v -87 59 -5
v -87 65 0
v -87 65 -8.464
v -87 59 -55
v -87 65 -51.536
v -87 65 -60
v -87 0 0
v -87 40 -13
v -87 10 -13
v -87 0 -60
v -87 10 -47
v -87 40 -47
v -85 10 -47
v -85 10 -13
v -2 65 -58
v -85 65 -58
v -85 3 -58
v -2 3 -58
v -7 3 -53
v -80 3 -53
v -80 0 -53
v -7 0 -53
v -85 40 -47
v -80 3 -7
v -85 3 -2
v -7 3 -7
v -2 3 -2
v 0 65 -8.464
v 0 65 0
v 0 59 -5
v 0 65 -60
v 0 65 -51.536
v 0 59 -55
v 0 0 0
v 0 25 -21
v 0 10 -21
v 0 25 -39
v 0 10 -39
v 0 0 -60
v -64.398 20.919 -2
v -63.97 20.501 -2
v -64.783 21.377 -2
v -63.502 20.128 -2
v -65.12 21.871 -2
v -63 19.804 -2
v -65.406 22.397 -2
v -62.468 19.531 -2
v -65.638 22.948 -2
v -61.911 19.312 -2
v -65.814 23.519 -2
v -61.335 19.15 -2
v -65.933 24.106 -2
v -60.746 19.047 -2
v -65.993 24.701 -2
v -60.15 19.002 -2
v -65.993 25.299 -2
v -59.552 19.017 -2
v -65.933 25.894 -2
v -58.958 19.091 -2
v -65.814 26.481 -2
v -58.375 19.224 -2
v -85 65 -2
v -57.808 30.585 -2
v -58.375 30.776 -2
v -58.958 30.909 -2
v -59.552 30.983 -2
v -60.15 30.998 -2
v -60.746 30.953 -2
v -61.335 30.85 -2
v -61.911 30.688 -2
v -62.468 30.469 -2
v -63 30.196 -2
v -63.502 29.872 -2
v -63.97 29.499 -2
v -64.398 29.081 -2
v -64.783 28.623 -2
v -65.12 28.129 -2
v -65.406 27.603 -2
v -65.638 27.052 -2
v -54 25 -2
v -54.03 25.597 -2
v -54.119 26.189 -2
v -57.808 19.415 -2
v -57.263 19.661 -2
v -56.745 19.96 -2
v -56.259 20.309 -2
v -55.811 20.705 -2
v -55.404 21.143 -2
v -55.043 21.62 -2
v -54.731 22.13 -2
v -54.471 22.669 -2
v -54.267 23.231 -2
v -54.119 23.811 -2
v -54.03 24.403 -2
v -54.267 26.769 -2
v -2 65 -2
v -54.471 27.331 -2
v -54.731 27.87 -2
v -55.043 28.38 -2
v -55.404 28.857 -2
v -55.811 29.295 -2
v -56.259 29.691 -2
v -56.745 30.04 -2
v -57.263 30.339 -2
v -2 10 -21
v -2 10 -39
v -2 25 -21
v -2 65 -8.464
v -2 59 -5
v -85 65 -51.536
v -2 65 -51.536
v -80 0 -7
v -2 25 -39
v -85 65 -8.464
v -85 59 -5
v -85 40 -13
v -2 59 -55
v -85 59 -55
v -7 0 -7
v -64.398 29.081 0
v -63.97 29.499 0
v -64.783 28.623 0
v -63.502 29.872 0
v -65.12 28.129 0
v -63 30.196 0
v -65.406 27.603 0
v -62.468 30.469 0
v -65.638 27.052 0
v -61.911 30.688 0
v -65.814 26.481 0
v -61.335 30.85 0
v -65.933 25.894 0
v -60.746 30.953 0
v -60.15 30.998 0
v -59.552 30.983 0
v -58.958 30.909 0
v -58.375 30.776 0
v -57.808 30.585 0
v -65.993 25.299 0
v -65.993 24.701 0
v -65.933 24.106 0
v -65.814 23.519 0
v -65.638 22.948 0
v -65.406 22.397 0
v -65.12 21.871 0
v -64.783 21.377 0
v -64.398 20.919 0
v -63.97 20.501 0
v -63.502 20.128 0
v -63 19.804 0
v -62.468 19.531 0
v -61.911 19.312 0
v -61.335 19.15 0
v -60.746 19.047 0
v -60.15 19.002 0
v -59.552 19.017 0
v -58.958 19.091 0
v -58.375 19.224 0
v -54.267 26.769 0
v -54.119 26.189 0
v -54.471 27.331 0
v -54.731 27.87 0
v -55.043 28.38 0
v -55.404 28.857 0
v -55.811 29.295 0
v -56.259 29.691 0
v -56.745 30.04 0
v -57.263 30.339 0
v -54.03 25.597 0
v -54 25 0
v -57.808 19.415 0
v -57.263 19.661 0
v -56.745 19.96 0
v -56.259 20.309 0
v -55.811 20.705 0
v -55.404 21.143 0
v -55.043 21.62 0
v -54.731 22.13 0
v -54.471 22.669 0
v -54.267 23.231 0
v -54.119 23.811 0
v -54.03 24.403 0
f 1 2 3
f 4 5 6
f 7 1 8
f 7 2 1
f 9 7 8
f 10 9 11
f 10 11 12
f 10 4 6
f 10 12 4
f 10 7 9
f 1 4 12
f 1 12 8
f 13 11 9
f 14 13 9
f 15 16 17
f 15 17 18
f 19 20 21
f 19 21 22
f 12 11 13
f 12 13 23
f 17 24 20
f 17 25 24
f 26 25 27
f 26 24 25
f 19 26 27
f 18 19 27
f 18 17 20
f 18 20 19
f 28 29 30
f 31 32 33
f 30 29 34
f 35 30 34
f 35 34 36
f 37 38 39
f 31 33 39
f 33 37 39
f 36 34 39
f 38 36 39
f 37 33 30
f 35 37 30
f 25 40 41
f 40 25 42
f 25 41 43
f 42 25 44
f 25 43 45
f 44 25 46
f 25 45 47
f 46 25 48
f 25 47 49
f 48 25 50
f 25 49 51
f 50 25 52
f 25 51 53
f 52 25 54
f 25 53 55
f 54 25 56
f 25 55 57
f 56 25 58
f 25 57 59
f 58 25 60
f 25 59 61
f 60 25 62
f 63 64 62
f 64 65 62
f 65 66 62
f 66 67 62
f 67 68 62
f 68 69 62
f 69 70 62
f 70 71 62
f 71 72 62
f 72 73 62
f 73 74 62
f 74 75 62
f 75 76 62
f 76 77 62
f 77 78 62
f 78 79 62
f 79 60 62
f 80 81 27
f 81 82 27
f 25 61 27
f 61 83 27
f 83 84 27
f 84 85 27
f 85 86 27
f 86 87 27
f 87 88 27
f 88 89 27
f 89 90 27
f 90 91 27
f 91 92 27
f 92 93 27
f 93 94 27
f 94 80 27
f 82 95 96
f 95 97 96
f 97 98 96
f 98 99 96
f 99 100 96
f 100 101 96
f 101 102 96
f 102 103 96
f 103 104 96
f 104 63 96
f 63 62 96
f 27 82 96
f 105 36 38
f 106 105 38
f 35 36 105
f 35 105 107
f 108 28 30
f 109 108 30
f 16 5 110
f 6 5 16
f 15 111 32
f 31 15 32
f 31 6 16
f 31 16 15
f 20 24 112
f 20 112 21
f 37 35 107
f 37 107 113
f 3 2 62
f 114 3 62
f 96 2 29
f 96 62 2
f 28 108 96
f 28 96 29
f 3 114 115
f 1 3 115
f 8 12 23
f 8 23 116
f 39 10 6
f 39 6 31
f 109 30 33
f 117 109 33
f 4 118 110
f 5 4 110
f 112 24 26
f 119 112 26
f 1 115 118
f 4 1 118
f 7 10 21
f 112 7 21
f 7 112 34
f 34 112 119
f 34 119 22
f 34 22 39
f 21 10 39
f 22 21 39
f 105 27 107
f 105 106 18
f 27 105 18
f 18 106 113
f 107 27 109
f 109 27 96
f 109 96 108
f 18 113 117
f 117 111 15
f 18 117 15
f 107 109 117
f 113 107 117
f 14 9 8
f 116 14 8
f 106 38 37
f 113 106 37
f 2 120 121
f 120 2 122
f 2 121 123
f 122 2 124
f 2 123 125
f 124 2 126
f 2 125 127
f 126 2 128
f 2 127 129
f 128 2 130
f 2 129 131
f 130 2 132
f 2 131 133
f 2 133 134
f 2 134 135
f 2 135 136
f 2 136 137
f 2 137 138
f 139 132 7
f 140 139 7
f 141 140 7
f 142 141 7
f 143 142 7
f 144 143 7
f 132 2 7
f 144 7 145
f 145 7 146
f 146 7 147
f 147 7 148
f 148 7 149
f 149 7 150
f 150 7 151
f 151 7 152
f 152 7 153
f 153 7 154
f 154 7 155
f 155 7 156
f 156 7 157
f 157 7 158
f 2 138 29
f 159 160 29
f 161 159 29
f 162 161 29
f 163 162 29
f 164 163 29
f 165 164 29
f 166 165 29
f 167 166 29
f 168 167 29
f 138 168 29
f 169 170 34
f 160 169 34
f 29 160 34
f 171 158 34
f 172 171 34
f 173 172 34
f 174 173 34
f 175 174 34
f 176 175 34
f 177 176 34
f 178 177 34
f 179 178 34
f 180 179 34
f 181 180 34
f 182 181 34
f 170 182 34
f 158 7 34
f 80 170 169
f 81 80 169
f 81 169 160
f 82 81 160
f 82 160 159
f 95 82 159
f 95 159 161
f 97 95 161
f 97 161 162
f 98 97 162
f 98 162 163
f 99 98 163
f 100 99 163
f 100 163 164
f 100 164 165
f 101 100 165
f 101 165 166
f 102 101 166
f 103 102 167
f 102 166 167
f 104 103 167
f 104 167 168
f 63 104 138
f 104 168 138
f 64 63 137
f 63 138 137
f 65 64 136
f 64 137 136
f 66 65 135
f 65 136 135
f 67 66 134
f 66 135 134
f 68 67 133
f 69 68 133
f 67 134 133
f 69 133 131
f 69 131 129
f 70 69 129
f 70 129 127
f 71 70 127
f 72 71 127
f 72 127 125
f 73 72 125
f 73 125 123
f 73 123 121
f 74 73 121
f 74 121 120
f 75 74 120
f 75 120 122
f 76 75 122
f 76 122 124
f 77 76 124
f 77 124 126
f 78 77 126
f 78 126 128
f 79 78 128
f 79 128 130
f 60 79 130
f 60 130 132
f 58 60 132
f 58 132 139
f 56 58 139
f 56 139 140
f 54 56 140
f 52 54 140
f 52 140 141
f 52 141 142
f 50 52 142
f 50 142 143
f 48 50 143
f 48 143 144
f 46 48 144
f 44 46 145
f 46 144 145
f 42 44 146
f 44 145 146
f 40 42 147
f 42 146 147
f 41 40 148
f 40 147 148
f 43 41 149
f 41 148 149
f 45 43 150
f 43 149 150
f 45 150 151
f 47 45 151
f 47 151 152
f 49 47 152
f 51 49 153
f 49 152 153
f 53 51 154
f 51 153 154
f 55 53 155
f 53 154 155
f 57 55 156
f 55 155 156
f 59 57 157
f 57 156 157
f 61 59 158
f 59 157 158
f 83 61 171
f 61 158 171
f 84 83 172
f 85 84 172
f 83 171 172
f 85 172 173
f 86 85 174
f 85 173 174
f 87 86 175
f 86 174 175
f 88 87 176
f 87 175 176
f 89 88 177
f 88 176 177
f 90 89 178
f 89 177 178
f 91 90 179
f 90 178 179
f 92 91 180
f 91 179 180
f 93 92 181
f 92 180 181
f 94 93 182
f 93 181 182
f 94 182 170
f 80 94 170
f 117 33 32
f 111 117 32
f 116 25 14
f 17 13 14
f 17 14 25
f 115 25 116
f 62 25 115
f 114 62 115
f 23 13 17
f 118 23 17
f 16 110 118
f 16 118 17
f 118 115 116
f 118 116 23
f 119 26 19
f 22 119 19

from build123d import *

# Parameters (mm, degrees)
SKETCH1_W           = 87
SKETCH1_H           = 60
BOSS_EXTRUDE1_DEPTH = 65
SKETCH2_W           = 83
SKETCH2_H           = 56
CUT_EXTRUDE1_DEPTH  = 62
SKETCH3_W           = 18
SKETCH3_H           = 15
CUT_EXTRUDE2_DEPTH  = 57
SKETCH4_R           = 6
CUT_EXTRUDE3_DEPTH  = 24
SKETCH5_W           = 34
SKETCH5_H           = 30
CUT_EXTRUDE4_DEPTH  = 24
CUT_EXTRUDE5_DEPTH  = 117
SKETCH7_W           = 73
SKETCH7_H           = 46
CUT_EXTRUDE6_DEPTH  = 10


with BuildPart() as part:
    # Sketch1 → Boss-Extrude1 (new body)
    with BuildSketch(Plane(origin=(0, 0, 0), x_dir=(1, 0, 0), z_dir=(0, 1, 0))):
        with Locations((-43.5, 30)):
            Rectangle(SKETCH1_W, SKETCH1_H)
    extrude(amount=BOSS_EXTRUDE1_DEPTH)

    # Sketch2 → Cut-Extrude1 (cut)
    with BuildSketch(Plane(origin=(0, 65, 0), x_dir=(1, 0, 0), z_dir=(0, 1, 0))):
        with Locations((-43.5, 30)):
            Rectangle(SKETCH2_W, SKETCH2_H)
    extrude(amount=-CUT_EXTRUDE1_DEPTH, mode=Mode.SUBTRACT)

    # Sketch3 → Cut-Extrude2 (cut)
    with BuildSketch(Plane(origin=(0, 0, 0), x_dir=(0, 0, -1), z_dir=(1, 0, 0))):
        with Locations((30, 17.5)):
            Rectangle(SKETCH3_W, SKETCH3_H)
    extrude(amount=-CUT_EXTRUDE2_DEPTH, mode=Mode.SUBTRACT)

    # Sketch4 → Cut-Extrude3 (cut)
    with BuildSketch(Plane.XY):
        with Locations((-60, 25)):
            Circle(SKETCH4_R)
    extrude(amount=-CUT_EXTRUDE3_DEPTH, mode=Mode.SUBTRACT)

    # Sketch5 → Cut-Extrude4 (cut)
    with BuildSketch(Plane.ZY.offset(87)):
        with Locations((-30, 25)):
            Rectangle(SKETCH5_W, SKETCH5_H)
    extrude(amount=-CUT_EXTRUDE4_DEPTH, mode=Mode.SUBTRACT)

    # Sketch6 → Cut-Extrude5 (cut)
    with BuildSketch(Plane(origin=(0, 0, 0), x_dir=(0, 0, -1), z_dir=(1, 0, 0))):
        Polygon((8.464101615, 65), (5, 59), (55, 59), (51.535898385, 65), align=None)
    extrude(amount=-CUT_EXTRUDE5_DEPTH, mode=Mode.SUBTRACT)

    # Sketch7 → Cut-Extrude6 (cut)
    with BuildSketch(Plane(origin=(0, 3, 0), x_dir=(1, 0, 0), z_dir=(0, 1, 0))):
        with Locations((-43.5, 30)):
            Rectangle(SKETCH7_W, SKETCH7_H)
    extrude(amount=-CUT_EXTRUDE6_DEPTH, mode=Mode.SUBTRACT)


solid = part.part
